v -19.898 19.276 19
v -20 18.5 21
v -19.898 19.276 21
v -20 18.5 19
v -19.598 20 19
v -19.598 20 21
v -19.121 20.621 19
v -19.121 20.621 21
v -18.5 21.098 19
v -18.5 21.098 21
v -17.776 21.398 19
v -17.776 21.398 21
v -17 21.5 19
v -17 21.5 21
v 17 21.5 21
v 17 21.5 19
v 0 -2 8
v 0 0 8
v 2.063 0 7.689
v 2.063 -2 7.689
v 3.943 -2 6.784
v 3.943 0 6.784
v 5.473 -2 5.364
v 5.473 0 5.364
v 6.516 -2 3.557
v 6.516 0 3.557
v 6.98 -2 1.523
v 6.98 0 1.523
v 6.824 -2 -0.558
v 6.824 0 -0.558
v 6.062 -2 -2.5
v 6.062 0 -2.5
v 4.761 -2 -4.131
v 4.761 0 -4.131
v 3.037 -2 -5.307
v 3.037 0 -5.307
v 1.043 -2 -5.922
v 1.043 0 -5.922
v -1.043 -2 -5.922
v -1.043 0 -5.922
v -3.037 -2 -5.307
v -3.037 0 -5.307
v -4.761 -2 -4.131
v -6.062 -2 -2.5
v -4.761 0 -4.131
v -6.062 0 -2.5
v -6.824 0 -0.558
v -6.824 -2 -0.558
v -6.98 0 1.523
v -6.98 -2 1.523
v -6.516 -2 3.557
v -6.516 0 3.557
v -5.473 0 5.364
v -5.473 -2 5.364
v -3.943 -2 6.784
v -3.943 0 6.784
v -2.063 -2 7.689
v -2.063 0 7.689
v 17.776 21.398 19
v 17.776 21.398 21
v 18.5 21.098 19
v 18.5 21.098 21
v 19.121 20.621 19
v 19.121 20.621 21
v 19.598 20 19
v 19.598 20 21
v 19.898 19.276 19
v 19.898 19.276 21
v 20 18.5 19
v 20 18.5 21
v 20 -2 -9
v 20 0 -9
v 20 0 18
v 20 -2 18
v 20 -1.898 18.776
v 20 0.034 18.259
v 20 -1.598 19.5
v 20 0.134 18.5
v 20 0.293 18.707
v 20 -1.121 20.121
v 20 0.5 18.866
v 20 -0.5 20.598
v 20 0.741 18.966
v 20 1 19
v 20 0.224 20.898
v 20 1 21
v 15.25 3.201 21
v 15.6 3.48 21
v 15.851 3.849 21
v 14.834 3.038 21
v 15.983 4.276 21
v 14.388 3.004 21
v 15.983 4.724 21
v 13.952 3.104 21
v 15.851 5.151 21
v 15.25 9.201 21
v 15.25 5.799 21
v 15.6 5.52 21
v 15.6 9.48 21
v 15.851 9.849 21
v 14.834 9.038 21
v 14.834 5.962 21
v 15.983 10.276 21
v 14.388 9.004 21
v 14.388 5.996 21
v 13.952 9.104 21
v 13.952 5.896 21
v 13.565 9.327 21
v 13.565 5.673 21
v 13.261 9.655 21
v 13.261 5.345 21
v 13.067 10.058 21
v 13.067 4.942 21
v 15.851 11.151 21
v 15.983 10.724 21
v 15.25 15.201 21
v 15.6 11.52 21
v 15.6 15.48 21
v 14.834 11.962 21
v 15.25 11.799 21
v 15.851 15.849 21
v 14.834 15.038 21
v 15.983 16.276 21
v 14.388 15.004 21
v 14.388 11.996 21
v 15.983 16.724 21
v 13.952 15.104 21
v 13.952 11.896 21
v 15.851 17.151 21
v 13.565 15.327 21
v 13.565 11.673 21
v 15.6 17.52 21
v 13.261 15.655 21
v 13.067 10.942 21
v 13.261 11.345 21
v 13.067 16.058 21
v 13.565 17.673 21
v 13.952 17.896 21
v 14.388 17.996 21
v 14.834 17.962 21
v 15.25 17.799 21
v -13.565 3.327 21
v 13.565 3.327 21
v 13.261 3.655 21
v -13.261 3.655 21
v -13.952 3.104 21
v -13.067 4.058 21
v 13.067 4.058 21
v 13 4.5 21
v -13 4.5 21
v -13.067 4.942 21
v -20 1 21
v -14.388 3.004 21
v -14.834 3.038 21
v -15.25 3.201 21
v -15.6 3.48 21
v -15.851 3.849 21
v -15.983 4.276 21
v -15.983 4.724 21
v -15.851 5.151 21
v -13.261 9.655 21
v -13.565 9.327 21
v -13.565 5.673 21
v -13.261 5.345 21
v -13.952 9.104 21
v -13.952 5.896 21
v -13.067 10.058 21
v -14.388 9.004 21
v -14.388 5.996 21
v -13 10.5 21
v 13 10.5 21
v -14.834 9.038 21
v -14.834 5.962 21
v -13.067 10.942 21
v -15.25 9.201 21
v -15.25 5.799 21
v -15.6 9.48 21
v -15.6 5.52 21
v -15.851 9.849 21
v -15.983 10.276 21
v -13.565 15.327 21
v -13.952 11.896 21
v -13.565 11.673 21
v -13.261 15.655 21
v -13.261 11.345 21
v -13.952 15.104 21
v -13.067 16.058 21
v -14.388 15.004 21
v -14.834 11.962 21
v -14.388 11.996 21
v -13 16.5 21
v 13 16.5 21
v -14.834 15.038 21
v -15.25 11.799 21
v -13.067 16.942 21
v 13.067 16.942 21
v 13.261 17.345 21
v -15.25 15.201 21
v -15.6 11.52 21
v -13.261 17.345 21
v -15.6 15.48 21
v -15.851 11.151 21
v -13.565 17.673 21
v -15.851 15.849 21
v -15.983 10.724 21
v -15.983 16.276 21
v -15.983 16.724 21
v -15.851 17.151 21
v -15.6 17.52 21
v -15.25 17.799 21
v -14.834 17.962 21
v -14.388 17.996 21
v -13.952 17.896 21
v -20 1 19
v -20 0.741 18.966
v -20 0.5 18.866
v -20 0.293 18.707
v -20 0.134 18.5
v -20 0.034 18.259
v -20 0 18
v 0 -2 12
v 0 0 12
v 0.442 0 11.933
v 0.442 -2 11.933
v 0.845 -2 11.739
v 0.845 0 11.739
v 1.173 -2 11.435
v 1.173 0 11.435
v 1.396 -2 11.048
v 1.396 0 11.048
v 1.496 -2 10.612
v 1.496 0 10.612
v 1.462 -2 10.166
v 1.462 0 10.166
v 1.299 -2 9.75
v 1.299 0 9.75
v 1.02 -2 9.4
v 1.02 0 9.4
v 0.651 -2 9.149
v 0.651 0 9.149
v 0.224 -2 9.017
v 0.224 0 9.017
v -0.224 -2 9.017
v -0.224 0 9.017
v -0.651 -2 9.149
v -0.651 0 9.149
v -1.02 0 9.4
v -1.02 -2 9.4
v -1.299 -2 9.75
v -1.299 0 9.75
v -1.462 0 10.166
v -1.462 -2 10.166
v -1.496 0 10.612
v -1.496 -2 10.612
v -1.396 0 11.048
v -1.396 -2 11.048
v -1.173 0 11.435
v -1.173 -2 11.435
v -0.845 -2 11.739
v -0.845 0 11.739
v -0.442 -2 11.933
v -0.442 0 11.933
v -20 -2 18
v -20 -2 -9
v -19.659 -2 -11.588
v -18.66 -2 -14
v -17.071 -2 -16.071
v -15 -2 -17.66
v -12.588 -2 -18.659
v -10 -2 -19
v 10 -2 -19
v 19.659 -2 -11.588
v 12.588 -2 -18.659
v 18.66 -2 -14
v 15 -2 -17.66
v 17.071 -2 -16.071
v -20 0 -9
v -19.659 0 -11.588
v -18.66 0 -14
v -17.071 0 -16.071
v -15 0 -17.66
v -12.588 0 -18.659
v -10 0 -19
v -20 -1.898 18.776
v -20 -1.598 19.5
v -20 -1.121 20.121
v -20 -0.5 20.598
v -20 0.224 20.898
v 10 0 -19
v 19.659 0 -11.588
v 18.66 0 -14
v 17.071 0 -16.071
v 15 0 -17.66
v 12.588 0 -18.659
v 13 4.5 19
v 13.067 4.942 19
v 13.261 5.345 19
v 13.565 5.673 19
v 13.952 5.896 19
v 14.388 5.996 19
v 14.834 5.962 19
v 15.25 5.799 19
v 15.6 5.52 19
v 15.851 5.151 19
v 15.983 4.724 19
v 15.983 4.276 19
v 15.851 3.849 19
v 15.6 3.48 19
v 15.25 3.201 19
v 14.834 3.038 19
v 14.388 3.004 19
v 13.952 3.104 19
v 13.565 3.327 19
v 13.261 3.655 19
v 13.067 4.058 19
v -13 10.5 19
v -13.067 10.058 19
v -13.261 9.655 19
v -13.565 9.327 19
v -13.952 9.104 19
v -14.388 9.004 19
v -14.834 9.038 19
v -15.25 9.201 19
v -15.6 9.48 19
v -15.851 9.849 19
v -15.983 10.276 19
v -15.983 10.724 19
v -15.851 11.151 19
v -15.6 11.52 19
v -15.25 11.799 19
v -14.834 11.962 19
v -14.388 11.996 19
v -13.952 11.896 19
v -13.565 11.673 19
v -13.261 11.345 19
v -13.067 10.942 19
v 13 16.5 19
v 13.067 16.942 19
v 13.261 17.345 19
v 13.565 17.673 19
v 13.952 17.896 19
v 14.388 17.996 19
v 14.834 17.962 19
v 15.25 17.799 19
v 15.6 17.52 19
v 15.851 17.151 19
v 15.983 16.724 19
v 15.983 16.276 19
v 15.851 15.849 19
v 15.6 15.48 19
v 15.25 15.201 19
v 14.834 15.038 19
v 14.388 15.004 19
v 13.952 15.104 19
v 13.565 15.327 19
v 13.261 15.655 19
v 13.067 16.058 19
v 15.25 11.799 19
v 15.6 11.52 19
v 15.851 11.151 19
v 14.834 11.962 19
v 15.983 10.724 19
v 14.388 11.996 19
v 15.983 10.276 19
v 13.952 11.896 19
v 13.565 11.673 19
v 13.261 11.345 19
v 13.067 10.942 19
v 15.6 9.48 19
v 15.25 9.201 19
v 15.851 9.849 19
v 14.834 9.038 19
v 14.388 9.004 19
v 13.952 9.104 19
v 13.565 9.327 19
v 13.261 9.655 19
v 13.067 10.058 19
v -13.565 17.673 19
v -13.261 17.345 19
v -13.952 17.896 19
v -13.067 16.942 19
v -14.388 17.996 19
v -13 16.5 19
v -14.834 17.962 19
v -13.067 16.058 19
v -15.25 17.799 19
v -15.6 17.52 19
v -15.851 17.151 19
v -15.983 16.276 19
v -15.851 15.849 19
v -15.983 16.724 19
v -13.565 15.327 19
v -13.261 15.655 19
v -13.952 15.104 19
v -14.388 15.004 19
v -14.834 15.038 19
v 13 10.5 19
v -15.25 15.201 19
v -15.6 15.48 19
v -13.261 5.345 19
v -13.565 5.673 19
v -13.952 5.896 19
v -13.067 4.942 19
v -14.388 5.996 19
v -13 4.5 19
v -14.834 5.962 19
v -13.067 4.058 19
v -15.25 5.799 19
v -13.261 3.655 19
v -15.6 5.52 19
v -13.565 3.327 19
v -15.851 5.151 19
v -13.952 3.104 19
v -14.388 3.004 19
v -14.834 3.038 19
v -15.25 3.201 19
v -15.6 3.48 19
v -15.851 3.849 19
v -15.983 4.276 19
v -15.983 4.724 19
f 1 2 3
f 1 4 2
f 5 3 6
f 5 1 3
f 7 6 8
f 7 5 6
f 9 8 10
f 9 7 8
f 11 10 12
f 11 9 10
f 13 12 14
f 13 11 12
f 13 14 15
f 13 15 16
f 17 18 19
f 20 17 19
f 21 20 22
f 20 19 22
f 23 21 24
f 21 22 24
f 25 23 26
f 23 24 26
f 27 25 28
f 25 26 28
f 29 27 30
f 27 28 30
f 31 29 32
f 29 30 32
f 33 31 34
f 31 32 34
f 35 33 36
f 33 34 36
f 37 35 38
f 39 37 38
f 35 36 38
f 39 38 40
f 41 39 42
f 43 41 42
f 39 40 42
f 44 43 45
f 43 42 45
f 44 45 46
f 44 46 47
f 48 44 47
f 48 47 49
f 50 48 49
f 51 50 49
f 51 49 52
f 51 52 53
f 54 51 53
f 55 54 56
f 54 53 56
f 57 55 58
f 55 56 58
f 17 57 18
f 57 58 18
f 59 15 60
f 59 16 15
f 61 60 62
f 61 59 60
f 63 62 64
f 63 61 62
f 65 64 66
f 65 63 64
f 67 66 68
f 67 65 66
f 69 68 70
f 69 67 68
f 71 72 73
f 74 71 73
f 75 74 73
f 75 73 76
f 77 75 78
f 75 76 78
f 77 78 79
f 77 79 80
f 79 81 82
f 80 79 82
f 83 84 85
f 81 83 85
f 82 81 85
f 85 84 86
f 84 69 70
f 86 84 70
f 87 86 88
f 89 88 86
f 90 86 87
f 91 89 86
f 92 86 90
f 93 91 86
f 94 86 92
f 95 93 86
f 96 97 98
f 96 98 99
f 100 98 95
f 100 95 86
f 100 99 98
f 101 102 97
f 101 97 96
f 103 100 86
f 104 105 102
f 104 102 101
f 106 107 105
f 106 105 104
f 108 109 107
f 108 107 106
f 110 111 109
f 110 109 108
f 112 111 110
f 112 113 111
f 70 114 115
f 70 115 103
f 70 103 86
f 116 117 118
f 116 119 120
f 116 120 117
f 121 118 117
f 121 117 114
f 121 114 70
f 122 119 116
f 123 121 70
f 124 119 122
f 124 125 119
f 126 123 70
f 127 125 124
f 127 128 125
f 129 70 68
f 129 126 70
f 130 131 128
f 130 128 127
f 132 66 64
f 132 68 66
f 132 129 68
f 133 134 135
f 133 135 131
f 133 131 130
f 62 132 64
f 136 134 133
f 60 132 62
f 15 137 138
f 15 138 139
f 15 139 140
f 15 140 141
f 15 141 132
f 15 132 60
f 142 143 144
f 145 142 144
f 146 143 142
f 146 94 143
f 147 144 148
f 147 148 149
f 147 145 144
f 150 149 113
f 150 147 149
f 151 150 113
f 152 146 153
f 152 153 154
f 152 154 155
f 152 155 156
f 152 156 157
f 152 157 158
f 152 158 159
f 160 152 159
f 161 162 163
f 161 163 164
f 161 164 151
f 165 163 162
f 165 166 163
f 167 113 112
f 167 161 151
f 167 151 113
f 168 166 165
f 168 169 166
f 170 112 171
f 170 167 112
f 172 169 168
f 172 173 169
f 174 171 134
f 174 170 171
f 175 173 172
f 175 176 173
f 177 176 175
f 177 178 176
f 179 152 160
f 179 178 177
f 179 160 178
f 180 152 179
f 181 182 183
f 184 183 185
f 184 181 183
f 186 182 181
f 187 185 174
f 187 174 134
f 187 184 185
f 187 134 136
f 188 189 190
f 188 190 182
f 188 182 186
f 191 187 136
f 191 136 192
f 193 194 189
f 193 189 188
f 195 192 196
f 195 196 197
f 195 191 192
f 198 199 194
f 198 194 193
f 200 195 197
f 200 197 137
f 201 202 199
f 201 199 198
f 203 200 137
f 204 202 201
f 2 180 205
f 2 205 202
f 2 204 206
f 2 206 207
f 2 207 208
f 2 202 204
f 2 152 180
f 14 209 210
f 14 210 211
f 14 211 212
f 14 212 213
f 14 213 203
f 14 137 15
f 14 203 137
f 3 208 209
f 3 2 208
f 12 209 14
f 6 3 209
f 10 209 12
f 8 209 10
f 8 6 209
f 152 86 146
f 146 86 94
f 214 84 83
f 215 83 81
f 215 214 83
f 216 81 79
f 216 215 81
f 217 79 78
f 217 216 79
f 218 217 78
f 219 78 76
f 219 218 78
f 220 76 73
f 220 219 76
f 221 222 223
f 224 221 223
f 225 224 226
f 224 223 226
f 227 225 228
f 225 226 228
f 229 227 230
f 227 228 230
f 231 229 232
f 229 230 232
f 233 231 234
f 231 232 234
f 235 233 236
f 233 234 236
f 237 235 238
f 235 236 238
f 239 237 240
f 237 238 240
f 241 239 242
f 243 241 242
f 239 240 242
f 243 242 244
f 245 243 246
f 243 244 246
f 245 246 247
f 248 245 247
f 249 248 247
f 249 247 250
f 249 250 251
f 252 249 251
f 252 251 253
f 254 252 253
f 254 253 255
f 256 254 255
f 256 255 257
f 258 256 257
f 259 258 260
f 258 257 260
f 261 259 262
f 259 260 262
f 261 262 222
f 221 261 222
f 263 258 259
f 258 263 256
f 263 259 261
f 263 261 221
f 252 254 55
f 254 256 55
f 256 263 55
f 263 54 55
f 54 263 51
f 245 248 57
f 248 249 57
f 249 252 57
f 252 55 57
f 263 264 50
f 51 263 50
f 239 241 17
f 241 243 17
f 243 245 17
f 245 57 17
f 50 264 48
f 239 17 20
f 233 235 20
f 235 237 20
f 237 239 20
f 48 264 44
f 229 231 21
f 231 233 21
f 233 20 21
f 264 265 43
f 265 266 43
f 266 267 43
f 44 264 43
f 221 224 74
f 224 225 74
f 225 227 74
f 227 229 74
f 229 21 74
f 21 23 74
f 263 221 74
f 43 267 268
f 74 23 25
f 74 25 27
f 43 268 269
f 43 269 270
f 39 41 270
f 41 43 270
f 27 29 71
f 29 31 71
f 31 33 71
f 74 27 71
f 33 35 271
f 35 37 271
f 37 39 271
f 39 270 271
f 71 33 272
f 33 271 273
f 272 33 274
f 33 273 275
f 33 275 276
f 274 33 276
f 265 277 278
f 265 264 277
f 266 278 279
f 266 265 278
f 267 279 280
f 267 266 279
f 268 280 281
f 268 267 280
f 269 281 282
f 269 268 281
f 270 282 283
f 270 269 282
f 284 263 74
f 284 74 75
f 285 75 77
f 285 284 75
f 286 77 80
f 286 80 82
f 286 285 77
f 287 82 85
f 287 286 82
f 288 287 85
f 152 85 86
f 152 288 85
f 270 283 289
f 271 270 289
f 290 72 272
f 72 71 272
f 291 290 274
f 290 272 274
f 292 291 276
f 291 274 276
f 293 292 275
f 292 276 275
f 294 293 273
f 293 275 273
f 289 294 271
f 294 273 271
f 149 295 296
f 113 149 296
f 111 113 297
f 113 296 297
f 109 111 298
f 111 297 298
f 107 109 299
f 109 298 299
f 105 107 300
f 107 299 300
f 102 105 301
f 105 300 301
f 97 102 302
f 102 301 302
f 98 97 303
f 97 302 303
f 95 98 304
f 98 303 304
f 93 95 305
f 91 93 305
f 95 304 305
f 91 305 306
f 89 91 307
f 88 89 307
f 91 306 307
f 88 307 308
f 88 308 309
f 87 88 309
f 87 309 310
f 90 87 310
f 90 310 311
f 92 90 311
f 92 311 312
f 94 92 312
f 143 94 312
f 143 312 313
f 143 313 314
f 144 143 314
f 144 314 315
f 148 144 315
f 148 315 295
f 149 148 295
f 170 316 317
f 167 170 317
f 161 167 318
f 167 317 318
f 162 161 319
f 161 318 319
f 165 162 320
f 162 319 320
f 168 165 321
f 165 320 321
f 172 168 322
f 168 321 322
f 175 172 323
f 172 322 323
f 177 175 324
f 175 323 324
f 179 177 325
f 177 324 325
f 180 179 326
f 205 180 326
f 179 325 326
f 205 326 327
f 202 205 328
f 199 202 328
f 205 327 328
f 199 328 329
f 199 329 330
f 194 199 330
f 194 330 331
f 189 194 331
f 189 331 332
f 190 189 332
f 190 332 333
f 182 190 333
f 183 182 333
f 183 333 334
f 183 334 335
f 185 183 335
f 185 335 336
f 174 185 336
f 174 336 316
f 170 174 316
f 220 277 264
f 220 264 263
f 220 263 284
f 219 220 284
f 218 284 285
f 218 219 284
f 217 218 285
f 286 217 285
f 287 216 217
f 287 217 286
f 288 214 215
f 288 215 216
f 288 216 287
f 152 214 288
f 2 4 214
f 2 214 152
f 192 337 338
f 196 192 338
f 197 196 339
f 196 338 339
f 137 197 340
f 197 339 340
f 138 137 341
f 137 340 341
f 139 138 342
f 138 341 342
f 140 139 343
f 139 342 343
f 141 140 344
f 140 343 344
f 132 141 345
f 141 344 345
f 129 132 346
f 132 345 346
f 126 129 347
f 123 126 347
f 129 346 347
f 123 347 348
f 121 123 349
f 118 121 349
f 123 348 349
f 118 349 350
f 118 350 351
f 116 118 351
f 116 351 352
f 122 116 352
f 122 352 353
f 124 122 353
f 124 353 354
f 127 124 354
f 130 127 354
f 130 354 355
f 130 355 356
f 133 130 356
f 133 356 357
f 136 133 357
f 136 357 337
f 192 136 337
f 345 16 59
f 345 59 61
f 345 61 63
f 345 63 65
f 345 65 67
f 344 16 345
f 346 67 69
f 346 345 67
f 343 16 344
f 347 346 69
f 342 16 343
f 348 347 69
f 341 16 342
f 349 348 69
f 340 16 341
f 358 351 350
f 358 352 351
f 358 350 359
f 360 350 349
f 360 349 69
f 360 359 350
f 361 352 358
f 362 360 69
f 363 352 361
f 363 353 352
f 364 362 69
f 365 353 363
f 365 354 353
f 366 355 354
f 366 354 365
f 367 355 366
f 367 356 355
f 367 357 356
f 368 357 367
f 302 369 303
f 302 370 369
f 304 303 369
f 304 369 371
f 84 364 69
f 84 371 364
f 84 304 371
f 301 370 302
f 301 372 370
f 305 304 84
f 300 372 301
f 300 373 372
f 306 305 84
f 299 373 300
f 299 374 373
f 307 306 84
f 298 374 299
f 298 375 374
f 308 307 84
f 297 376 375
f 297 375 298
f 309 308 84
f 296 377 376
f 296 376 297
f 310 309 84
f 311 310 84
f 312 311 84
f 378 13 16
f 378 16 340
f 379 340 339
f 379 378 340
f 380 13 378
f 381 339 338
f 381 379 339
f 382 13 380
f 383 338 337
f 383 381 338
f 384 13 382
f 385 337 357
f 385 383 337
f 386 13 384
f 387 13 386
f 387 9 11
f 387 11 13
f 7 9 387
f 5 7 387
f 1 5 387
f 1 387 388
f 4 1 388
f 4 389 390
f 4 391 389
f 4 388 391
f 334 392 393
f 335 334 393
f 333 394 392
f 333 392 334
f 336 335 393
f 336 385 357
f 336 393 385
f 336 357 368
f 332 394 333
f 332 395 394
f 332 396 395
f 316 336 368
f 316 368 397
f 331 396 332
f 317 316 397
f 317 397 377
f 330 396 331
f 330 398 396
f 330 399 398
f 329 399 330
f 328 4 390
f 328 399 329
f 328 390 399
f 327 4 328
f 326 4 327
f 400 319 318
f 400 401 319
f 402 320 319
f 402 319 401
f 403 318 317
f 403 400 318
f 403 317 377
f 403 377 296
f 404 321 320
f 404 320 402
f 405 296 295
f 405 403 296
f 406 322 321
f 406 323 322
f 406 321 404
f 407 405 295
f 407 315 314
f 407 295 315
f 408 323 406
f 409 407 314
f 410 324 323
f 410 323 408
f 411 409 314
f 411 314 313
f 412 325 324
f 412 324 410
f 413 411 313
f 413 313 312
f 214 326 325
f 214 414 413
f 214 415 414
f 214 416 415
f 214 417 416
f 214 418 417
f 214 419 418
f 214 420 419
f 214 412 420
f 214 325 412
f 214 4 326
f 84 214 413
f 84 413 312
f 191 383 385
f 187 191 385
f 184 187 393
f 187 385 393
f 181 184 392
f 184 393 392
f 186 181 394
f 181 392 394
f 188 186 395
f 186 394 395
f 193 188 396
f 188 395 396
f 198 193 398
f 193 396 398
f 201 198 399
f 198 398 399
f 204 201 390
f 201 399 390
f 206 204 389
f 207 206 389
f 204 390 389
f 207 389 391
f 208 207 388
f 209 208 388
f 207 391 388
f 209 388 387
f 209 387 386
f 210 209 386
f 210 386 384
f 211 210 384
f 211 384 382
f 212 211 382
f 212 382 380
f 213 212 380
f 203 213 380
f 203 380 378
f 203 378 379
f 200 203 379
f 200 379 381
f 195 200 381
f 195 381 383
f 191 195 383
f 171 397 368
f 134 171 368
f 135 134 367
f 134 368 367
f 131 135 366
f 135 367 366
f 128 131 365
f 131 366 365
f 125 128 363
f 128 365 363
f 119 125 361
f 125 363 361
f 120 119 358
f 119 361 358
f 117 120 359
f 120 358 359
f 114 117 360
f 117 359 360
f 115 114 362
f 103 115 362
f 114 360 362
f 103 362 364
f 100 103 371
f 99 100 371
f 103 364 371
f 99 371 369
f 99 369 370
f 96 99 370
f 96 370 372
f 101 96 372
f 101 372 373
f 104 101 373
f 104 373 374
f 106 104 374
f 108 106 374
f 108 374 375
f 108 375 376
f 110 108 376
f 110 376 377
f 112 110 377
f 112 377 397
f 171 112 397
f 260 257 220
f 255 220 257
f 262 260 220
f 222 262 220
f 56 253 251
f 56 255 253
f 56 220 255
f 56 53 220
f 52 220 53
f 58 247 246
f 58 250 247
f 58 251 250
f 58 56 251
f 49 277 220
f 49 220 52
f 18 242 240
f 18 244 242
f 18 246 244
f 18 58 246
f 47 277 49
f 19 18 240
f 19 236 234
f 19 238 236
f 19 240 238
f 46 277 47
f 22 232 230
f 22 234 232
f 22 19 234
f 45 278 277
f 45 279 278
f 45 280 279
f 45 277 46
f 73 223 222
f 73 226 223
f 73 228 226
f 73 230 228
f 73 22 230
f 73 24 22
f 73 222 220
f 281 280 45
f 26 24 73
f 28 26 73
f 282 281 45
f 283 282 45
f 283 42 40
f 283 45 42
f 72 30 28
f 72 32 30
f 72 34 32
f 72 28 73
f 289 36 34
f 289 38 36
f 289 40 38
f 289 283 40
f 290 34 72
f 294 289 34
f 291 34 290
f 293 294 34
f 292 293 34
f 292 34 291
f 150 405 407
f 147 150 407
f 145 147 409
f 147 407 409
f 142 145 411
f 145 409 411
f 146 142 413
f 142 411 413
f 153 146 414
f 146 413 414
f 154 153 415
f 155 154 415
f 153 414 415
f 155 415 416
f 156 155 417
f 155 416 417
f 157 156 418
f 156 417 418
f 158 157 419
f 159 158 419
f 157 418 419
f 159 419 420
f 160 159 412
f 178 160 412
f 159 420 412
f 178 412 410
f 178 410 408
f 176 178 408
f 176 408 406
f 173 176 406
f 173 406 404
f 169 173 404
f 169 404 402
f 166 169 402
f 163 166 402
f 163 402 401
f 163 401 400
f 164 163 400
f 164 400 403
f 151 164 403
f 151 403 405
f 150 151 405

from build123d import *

# Parameters (mm, degrees)
SKETCH1_W                    = 40
SKETCH1_H                    = 38
SKETCH1_R                    = 7
SKETCH1_R_2                  = 1.5
BASE_FLANGE1_DEPTH           = 2
EDGE_FLANGE1_STRIP_W         = 10
EDGE_FLANGE1_STRIP_H         = 2
EDGE_FLANGE1_STRIP_CUT_DEPTH = 40
EDGE_FLANGE1_DEPTH           = 40
FILLET1_R                    = 10
FILLET2_R                    = 3
SKETCH10_R                   = 1.5
CUT_EXTRUDE1_DEPTH           = 49.023431781


# Sheet-metal steps are written as plain solids
with BuildPart() as part:
    # Sketch1 → Base-Flange1 (new body)
    with BuildSketch(Plane(origin=(0, 0, 0), x_dir=(1, 0, 0), z_dir=(0, 1, 0))):
        Rectangle(SKETCH1_W, SKETCH1_H)
        with Locations(Location((0, -1, 0), (0, 0, 270))):
            Circle(SKETCH1_R, mode=Mode.SUBTRACT)
        with Locations(Location((0, -10.5, 0), (0, 0, 270))):
            Circle(SKETCH1_R_2, mode=Mode.SUBTRACT)
    extrude(amount=-BASE_FLANGE1_DEPTH)

    # Edge-Flange1 strip (across the edge) → Edge-Flange1 strip cut (cut)
    with BuildSketch(Plane(origin=(-20, 0, 19), x_dir=(0, 0, -1), z_dir=(1, 0, 0))):
        with Locations((-4, -1)):
            Rectangle(EDGE_FLANGE1_STRIP_W, EDGE_FLANGE1_STRIP_H)
    extrude(amount=EDGE_FLANGE1_STRIP_CUT_DEPTH, mode=Mode.SUBTRACT)

    # Edge-Flange1 section (across the edge) → Edge-Flange1 (add)
    with BuildSketch(Plane(origin=(-20, 0, 19), x_dir=(0, 0, -1), z_dir=(1, 0, 0))):
        with BuildLine():
            Line((-2, 1), (-2, 21.5))
            Line((-2, 21.5), (0, 21.5))
            Line((0, 21.5), (0, 1))
            ThreePointArc((0, 1), (0.292893219, 0.292893219), (1, 0))
            Line((1, 0), (1, -2))
            ThreePointArc((1, -2), (-1.121320344, -1.121320344), (-2, 1))
        make_face()
    extrude(amount=EDGE_FLANGE1_DEPTH)

    # Fillet1
    fillet1_edges = [part.edges().sort_by_distance(p)[0] for p in [
        (-20, -1, -19),
        (20, -1, -19),
    ]]
    fillet(fillet1_edges, radius=FILLET1_R)

    # Fillet2
    fillet2_edges = [part.edges().sort_by_distance(p)[0] for p in [
        (-20, 21.5, 20),
        (20, 21.5, 20),
    ]]
    fillet(fillet2_edges, radius=FILLET2_R)

    # Sketch10 → Cut-Extrude1 (cut, through all)
    with BuildSketch(Plane(origin=(0, 0, 19), x_dir=(-1, 0, 0), z_dir=(0, 0, -1))):
        with Locations((-14.5, 16.5)):
            Circle(SKETCH10_R)
        with Locations((-14.5, 10.5)):
            Circle(SKETCH10_R)
        with Locations((-14.5, 4.5)):
            Circle(SKETCH10_R)
        with Locations(Location((14.5, 4.5, 0), (0, 0, 180))):
            Circle(SKETCH10_R)
        with Locations(Location((14.5, 10.5, 0), (0, 0, 180))):
            Circle(SKETCH10_R)
        with Locations(Location((14.5, 16.5, 0), (0, 0, 180))):
            Circle(SKETCH10_R)
    extrude(amount=-CUT_EXTRUDE1_DEPTH, mode=Mode.SUBTRACT)


solid = part.part
